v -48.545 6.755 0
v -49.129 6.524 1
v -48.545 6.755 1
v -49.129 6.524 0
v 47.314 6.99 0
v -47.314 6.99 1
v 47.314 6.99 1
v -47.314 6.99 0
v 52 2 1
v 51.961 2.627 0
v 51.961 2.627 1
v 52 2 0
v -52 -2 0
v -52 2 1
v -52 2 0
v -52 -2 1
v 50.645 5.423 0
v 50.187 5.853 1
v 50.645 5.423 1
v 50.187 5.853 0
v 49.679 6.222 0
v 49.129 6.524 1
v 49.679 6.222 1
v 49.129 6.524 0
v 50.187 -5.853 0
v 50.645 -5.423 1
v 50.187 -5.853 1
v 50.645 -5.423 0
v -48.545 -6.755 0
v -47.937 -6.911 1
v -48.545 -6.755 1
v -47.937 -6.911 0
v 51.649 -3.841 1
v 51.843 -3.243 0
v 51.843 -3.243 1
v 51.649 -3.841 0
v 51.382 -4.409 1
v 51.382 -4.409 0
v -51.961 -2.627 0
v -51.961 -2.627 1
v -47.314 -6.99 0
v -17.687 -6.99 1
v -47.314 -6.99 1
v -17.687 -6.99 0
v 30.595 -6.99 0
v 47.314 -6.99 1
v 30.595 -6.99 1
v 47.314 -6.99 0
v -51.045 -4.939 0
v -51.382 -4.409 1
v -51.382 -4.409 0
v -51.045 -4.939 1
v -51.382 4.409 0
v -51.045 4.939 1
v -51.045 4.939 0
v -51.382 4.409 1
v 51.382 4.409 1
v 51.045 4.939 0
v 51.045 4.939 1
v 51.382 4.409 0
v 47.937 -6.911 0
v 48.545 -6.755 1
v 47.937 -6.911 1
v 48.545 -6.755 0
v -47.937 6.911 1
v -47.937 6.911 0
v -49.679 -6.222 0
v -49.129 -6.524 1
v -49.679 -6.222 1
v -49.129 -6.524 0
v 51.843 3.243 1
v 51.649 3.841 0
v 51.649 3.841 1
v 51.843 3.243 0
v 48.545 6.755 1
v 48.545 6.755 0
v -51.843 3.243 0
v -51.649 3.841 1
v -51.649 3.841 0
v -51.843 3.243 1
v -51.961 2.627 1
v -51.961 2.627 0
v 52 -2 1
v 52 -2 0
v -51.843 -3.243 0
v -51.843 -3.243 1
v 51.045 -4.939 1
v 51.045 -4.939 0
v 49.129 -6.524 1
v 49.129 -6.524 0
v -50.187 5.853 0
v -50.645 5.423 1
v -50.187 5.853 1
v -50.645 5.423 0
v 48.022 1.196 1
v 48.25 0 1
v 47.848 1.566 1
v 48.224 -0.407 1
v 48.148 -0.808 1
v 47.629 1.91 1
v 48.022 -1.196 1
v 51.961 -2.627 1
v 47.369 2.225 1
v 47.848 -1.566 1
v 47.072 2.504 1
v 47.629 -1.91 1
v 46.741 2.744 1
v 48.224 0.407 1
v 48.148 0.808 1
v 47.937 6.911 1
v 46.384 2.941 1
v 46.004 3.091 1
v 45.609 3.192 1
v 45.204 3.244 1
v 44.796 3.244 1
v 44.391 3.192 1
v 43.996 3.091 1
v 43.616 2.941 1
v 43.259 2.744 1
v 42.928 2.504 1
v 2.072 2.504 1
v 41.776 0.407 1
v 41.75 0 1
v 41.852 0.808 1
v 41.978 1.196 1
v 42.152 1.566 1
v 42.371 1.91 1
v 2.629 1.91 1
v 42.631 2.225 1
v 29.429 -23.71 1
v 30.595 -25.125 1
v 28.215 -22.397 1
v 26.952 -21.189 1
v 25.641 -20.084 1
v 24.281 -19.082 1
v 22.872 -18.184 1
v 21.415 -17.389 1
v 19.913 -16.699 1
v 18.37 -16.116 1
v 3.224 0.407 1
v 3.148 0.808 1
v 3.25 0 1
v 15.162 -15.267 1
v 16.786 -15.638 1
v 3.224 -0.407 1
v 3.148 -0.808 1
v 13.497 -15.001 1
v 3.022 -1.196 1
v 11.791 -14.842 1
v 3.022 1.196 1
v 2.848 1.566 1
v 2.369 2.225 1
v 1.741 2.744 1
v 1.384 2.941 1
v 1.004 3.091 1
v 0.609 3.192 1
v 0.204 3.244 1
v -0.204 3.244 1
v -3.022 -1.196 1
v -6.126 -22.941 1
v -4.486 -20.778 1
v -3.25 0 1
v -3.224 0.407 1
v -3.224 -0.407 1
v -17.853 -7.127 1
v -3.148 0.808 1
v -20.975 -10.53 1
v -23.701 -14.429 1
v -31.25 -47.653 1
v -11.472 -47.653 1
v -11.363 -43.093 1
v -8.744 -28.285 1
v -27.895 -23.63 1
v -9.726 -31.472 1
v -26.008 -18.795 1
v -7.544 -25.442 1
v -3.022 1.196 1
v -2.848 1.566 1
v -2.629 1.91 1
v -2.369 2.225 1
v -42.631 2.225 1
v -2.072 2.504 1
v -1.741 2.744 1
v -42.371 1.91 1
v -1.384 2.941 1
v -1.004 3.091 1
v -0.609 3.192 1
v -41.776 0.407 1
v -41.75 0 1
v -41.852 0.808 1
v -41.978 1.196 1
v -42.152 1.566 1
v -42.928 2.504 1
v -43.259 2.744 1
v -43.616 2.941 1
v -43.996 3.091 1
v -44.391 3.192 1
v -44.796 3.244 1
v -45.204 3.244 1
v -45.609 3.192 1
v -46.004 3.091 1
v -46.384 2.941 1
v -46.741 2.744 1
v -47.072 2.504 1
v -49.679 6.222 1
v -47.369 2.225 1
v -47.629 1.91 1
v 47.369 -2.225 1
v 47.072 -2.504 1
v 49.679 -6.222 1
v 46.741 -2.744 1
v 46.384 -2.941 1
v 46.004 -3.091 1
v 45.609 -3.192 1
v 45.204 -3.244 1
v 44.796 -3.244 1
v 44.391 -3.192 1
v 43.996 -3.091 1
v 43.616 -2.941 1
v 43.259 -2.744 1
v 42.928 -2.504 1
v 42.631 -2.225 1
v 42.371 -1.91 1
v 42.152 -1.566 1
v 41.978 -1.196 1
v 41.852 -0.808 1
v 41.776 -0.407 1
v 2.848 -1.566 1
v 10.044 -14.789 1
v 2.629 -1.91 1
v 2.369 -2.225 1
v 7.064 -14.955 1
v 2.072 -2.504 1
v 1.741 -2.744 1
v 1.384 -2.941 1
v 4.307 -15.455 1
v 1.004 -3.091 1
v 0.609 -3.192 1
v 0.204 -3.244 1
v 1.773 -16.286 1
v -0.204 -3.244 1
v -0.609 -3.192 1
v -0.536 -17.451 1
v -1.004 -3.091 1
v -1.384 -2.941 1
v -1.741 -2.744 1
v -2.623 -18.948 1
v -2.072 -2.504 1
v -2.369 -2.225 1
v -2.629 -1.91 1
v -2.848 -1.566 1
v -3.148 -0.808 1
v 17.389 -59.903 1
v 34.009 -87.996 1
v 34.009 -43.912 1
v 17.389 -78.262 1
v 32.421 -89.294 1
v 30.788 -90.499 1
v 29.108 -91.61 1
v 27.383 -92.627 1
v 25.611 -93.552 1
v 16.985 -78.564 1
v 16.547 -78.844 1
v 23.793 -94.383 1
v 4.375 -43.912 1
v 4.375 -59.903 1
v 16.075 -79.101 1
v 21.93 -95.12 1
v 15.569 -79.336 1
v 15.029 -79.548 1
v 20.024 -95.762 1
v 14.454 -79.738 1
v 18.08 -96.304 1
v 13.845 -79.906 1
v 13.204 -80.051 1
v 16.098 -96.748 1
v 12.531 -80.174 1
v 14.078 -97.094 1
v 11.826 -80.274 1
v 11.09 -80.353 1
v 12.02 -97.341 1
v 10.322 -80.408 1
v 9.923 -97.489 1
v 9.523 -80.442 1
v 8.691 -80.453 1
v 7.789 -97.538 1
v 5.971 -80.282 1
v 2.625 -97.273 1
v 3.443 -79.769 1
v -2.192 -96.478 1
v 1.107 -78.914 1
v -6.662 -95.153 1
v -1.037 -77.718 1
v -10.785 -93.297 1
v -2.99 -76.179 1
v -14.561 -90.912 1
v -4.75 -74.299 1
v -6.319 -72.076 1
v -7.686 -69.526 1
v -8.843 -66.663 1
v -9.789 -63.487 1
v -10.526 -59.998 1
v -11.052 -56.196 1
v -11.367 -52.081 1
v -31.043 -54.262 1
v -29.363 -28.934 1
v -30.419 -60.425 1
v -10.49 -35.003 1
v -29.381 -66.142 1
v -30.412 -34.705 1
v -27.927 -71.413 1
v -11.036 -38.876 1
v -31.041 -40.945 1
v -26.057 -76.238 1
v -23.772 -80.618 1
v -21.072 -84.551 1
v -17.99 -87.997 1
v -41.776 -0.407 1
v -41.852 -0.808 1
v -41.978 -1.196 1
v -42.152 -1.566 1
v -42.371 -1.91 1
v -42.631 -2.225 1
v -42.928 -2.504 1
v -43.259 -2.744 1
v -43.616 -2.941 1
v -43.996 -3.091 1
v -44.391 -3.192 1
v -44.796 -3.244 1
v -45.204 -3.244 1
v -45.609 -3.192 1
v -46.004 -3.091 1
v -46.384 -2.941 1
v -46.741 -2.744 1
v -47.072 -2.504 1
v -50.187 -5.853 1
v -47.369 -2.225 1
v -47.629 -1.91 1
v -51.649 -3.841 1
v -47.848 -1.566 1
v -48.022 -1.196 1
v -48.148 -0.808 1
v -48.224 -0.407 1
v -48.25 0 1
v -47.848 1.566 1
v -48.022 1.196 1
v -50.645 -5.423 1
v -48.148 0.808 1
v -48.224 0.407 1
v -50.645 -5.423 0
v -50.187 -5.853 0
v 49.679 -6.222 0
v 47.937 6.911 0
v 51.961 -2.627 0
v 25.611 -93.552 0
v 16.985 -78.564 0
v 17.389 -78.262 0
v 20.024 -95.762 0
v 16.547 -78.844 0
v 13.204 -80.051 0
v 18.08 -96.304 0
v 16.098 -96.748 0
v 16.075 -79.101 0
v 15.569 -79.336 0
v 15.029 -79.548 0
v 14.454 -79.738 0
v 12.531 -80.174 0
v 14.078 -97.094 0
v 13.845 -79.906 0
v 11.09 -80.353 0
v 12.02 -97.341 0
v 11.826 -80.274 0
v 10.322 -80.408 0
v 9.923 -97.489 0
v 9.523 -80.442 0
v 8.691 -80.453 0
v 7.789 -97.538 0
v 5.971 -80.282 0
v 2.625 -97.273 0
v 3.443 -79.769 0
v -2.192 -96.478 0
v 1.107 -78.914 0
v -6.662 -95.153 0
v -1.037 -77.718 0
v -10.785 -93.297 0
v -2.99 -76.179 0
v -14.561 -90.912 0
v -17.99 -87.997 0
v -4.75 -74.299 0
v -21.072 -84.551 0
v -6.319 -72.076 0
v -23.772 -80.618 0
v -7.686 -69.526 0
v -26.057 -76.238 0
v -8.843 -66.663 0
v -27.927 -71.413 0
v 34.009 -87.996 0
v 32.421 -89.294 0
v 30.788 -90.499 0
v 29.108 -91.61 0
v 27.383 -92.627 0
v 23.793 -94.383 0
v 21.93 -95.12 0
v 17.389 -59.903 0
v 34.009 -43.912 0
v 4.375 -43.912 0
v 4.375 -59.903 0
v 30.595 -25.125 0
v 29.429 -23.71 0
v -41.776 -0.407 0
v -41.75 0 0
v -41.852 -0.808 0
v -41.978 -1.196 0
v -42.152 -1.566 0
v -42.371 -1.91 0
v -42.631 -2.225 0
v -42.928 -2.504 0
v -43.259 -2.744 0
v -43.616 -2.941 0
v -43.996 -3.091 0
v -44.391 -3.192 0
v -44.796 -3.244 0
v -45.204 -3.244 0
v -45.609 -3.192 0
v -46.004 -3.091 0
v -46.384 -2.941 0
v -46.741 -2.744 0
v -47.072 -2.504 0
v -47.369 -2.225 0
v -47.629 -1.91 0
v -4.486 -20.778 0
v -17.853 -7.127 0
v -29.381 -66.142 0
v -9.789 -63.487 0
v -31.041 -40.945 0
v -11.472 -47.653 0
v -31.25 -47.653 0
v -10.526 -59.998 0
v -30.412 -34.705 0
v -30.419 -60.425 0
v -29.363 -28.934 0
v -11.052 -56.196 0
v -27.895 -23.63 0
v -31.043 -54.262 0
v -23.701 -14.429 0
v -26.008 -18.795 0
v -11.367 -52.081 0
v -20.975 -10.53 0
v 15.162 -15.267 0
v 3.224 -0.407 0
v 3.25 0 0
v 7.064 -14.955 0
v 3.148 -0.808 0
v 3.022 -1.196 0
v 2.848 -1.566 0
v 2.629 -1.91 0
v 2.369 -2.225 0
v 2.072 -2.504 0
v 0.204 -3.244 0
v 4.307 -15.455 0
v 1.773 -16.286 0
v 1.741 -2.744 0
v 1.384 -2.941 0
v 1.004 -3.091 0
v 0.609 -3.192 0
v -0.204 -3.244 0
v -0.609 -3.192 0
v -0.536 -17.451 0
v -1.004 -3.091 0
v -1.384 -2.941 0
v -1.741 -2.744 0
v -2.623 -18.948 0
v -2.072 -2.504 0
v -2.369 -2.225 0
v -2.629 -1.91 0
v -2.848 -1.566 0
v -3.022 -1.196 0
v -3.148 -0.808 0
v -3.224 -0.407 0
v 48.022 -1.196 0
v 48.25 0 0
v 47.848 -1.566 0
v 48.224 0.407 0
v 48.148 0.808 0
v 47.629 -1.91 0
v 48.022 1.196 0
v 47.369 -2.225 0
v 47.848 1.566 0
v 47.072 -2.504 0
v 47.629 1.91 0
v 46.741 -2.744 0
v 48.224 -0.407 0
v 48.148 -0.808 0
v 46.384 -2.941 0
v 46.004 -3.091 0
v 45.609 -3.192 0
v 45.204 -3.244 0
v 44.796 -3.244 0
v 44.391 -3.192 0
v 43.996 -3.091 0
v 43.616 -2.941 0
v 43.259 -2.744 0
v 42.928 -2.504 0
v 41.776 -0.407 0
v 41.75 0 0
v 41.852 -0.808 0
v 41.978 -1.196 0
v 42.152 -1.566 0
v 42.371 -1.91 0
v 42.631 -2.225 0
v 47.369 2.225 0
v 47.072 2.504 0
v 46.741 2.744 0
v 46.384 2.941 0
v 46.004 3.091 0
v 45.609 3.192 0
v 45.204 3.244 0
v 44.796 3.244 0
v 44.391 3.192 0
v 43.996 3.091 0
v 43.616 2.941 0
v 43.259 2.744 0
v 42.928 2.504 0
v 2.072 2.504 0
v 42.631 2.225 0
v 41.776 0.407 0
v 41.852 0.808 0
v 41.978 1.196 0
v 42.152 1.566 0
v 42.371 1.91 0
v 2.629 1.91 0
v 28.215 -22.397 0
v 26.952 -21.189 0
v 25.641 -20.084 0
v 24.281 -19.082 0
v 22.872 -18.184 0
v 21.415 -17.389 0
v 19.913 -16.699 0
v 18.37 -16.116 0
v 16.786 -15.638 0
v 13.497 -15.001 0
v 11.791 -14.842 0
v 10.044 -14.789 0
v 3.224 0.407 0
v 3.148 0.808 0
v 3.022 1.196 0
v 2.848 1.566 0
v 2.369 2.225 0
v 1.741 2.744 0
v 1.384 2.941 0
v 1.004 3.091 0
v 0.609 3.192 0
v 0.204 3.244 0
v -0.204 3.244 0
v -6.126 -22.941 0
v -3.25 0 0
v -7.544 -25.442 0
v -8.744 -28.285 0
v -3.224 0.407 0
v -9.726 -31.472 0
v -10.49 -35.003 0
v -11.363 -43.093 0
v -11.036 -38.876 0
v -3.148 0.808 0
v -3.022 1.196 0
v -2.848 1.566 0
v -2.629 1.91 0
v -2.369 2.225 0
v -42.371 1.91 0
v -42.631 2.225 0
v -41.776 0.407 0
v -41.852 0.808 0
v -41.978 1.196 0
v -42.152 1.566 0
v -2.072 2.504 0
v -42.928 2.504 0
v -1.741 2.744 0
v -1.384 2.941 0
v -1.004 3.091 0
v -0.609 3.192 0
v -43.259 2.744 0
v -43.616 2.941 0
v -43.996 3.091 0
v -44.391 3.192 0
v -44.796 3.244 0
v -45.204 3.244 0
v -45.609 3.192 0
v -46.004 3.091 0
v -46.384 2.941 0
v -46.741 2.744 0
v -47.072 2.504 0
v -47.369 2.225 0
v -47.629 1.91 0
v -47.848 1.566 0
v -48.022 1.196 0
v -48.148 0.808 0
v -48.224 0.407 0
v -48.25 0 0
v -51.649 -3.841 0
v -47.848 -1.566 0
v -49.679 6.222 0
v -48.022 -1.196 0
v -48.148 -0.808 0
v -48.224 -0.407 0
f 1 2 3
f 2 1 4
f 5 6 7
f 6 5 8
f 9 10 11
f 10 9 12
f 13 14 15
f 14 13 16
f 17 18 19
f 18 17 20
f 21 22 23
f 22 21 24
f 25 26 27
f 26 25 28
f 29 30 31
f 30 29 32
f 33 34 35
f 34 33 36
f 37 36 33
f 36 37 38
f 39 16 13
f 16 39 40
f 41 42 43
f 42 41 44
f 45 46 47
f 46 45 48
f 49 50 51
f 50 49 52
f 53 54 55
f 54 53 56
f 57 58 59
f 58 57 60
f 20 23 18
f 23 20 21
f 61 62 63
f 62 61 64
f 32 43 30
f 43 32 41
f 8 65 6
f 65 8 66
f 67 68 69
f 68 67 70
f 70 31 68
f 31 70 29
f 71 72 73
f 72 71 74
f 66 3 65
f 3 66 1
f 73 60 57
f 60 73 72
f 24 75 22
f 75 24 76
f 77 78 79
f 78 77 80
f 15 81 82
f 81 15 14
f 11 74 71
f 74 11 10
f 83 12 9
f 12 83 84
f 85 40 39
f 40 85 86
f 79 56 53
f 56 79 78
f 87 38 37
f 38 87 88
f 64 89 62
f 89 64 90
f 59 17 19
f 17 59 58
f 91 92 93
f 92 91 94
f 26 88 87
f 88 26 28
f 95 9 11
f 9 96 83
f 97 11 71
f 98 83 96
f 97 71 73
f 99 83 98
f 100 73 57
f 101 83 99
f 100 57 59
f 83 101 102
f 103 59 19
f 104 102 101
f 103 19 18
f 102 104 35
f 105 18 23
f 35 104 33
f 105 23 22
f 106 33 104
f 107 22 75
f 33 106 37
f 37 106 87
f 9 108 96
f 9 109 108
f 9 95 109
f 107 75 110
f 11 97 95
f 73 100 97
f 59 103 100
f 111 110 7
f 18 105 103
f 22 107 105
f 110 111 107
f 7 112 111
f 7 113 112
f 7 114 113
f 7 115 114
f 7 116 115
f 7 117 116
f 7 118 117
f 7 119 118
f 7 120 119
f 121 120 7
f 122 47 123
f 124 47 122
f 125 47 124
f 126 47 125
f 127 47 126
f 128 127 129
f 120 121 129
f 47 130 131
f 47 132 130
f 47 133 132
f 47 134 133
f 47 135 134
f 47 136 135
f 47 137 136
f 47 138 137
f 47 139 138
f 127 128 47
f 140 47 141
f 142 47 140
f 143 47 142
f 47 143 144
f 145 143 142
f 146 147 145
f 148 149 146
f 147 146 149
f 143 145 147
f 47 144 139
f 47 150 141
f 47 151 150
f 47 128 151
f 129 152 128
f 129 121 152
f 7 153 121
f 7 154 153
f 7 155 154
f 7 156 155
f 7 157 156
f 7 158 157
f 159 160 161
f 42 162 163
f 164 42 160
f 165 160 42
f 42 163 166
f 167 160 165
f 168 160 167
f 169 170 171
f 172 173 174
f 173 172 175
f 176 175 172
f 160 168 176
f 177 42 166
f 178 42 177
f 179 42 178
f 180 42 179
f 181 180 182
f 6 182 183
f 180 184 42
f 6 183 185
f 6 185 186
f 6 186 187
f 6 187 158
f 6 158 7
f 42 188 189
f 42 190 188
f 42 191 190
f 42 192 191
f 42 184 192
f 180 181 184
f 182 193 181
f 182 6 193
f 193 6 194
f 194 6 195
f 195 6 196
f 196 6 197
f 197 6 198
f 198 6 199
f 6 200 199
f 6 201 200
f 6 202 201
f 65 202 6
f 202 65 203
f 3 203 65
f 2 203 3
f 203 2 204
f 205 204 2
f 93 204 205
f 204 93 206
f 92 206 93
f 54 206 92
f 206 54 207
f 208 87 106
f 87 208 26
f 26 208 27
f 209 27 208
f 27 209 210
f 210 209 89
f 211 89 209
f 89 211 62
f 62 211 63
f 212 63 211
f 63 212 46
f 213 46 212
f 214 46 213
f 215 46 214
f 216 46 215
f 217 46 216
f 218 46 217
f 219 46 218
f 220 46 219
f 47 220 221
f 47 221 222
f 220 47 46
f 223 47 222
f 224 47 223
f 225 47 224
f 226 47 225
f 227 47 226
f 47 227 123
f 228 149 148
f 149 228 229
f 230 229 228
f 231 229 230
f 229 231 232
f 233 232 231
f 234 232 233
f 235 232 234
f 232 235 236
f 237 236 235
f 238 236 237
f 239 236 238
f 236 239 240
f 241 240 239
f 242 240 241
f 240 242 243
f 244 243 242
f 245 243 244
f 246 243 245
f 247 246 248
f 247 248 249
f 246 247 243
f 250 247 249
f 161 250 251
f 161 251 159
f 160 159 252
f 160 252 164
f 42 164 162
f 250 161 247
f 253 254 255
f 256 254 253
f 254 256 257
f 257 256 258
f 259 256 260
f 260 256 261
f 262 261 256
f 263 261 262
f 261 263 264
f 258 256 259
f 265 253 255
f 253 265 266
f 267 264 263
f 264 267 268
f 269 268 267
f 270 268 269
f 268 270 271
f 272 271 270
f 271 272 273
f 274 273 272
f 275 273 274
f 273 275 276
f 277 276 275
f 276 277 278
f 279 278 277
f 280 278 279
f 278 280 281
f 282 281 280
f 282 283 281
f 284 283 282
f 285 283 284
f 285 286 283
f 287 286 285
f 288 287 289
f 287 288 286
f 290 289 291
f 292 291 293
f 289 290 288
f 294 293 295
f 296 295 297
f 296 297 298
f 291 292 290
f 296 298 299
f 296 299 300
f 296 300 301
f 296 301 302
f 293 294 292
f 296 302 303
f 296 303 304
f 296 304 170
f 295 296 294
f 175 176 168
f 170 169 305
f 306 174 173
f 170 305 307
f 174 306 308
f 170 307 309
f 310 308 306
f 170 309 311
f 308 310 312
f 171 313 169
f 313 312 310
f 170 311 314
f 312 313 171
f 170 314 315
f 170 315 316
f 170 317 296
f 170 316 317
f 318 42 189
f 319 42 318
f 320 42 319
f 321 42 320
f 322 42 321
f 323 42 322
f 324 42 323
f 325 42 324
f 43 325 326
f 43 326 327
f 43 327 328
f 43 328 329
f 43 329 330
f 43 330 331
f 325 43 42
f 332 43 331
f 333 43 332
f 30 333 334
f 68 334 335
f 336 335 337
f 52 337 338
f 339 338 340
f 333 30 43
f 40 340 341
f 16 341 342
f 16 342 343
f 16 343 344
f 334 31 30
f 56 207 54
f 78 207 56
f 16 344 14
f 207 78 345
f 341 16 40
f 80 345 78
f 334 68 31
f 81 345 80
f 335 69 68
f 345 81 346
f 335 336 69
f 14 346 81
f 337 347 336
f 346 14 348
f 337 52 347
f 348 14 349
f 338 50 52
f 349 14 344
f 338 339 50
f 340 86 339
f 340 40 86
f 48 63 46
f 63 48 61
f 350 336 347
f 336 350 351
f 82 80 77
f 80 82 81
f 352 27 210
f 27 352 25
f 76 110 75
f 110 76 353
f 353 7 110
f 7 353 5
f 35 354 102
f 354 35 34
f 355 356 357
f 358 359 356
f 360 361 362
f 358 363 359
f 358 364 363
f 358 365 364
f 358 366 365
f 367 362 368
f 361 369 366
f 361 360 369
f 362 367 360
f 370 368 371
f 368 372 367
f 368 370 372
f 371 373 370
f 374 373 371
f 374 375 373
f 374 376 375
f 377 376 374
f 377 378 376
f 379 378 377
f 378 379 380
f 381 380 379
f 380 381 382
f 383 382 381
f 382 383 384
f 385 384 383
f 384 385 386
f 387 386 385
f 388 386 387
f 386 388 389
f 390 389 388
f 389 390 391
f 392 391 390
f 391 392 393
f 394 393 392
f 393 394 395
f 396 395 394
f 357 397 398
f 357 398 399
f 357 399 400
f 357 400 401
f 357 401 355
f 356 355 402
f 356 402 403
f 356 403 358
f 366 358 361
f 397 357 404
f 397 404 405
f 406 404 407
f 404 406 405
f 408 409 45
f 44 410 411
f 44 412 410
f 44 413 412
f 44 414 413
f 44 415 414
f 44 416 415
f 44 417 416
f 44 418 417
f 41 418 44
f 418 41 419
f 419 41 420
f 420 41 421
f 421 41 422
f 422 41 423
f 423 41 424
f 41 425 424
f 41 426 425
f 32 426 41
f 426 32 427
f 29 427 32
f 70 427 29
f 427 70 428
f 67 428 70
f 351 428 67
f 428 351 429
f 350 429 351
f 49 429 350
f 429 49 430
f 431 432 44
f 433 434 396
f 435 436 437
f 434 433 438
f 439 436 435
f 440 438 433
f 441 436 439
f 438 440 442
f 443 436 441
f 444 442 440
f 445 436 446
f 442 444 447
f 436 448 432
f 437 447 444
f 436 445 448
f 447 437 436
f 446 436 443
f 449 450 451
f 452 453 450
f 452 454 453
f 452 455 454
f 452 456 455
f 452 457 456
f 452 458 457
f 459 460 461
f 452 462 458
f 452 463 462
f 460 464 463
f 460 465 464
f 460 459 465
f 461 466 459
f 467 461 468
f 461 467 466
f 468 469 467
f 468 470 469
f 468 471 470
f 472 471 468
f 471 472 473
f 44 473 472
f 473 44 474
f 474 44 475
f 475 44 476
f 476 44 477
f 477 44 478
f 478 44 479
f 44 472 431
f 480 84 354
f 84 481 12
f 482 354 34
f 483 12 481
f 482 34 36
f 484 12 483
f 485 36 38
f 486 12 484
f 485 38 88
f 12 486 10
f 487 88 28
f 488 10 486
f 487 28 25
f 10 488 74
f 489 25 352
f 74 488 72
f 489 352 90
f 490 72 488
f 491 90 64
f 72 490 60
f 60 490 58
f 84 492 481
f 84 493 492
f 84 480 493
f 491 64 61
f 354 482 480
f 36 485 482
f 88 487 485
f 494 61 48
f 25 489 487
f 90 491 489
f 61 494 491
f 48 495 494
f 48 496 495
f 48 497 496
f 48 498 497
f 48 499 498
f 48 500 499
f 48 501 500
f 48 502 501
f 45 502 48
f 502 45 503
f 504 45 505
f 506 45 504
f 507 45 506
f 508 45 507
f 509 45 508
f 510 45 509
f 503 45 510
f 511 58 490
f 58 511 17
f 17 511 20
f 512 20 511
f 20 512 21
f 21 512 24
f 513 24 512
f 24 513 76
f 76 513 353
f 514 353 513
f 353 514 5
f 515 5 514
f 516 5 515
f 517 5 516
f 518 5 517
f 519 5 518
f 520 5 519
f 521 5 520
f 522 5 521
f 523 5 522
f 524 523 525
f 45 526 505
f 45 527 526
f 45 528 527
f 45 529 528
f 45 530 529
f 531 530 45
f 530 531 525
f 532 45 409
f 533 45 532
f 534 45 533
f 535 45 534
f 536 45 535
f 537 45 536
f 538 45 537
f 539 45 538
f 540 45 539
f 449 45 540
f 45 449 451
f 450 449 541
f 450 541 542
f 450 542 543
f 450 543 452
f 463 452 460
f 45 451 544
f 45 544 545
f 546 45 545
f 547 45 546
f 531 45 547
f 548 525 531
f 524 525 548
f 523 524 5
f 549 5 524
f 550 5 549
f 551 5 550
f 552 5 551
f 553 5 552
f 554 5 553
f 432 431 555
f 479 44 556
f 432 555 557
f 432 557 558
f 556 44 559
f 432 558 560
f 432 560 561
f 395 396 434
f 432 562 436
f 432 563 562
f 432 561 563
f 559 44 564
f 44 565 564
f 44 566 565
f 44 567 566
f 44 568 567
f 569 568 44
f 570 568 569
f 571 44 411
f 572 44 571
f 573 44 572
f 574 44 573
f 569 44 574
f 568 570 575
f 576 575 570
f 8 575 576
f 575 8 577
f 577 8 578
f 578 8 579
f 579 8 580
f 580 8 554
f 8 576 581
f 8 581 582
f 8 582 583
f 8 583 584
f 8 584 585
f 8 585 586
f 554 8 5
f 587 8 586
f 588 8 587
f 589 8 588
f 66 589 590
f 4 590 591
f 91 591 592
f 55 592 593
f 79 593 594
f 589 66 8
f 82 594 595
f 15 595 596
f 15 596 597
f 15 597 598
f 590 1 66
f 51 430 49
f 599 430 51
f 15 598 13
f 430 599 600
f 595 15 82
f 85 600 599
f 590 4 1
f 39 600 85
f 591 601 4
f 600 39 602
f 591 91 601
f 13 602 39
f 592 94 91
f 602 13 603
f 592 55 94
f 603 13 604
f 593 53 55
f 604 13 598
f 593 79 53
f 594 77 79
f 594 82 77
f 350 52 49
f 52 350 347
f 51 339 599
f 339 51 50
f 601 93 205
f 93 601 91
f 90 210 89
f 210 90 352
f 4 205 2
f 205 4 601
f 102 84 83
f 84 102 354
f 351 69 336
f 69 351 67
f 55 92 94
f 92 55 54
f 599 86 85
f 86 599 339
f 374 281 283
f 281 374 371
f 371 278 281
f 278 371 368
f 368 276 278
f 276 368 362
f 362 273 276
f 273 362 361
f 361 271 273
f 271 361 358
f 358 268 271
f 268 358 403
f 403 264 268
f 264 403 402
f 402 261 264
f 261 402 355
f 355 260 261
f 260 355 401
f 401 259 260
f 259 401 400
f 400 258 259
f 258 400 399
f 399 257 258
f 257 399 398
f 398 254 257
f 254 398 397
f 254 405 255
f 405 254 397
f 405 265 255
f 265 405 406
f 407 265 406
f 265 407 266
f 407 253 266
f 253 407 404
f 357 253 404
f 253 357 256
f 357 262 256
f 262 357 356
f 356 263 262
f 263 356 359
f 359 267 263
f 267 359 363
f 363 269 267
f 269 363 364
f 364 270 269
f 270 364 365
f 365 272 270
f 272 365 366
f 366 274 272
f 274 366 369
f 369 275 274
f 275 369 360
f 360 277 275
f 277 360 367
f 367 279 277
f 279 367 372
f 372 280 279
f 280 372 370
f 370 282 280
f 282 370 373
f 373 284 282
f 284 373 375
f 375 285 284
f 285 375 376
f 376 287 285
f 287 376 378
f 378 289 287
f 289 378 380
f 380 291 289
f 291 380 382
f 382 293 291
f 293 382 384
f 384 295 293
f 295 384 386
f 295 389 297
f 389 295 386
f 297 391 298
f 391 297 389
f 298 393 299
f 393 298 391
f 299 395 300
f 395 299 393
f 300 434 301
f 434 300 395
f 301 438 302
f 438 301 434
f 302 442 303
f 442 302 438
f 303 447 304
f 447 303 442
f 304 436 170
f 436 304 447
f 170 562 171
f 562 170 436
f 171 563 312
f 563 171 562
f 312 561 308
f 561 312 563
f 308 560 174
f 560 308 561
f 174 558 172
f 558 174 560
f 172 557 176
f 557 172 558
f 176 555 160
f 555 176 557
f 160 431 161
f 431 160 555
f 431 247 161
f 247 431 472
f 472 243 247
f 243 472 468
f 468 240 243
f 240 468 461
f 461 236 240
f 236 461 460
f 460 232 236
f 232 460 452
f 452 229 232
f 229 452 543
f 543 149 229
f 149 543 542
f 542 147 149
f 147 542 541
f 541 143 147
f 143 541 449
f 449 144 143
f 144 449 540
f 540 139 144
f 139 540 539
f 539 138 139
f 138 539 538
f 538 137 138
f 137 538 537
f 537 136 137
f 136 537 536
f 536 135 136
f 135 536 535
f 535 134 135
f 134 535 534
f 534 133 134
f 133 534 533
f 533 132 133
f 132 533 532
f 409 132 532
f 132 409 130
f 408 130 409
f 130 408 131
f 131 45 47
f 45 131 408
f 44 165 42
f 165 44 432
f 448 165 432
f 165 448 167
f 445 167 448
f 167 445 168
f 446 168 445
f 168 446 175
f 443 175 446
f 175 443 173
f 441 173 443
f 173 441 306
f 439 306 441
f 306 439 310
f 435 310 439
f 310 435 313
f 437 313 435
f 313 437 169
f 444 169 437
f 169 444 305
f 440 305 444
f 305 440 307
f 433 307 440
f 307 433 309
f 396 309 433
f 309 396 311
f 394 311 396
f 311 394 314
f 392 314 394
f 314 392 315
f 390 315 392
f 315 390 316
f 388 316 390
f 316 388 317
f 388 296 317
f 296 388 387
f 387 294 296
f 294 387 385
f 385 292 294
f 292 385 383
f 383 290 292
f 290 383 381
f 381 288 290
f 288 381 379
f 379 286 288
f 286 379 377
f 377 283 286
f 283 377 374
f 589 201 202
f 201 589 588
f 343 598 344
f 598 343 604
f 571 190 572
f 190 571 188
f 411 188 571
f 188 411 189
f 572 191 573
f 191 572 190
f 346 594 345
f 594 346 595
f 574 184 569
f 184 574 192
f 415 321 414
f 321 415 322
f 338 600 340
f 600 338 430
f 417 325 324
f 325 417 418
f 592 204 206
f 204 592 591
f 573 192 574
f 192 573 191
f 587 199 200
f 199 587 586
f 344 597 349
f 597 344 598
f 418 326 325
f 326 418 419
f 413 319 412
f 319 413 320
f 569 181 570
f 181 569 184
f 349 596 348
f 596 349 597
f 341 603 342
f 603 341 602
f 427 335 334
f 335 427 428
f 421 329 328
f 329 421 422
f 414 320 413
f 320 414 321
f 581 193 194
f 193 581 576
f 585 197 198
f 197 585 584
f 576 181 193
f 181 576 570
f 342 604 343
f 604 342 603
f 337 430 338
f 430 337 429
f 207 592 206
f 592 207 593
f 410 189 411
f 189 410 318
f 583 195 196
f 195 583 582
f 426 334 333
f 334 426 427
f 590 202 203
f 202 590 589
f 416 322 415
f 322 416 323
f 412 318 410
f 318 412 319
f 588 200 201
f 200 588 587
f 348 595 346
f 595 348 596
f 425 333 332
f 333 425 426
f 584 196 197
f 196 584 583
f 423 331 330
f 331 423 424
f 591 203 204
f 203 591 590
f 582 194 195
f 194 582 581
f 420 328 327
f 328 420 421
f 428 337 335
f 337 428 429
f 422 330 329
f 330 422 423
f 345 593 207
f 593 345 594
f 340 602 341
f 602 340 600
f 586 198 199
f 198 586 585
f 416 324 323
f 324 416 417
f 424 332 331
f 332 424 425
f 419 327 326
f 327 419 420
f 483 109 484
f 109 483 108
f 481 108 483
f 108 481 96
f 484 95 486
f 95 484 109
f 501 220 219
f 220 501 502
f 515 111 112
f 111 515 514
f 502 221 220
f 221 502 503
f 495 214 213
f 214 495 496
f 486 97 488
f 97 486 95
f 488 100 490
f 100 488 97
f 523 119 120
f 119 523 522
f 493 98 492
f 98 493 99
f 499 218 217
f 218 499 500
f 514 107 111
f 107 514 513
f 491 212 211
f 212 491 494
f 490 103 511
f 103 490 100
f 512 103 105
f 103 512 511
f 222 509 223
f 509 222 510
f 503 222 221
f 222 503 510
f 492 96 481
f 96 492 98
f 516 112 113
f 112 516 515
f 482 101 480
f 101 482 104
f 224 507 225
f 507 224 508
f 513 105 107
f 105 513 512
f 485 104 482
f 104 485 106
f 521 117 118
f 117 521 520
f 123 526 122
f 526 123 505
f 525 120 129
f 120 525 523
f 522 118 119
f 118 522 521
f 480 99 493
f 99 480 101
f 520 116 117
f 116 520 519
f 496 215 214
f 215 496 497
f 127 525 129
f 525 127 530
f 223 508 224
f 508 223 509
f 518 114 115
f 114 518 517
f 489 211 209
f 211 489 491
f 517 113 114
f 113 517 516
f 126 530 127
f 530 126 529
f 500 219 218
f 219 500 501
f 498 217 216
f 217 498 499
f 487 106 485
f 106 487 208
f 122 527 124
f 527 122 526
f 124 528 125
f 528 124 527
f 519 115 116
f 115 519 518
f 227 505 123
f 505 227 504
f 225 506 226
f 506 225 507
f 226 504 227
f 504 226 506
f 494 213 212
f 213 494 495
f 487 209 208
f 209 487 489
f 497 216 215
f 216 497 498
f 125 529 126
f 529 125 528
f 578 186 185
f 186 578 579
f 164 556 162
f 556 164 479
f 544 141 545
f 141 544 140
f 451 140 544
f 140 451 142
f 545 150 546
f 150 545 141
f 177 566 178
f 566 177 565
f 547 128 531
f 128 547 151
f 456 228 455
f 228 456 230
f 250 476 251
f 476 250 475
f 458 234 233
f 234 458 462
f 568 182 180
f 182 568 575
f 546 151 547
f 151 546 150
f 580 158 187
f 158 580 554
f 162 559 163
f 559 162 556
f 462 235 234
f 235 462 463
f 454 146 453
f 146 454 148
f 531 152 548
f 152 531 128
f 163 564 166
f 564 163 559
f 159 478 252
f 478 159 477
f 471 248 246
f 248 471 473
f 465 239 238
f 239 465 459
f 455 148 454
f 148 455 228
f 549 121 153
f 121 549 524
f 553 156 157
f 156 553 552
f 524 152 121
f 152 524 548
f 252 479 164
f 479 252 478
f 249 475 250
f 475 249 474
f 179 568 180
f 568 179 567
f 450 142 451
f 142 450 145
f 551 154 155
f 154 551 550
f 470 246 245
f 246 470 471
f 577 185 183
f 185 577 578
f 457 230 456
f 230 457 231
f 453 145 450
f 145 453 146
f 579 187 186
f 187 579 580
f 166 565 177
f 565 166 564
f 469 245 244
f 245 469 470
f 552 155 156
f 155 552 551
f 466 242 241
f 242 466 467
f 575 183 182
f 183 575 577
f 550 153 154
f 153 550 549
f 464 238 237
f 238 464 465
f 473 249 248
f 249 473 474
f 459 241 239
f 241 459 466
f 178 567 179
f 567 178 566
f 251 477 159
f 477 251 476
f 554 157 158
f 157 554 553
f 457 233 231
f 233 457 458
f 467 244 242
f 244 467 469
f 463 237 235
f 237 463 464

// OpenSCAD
$fn = 50;


difference() {
	union() {
		translate(v = [0, 0, 0]) {
			rotate(a = [0, 0, 0]) {
				hull() {
					translate(v = [-47.0000000000, 2.0000000000, 0]) {
						rotate(a = [0, 0, 0]) {
							translate(v = [0, 0, 0]) {
								rotate(a = [0, 0, 0]) {
									cylinder(h = 1, r = 5);
								}
							}
						}
					}
					translate(v = [47.0000000000, 2.0000000000, 0]) {
						rotate(a = [0, 0, 0]) {
							translate(v = [0, 0, 0]) {
								rotate(a = [0, 0, 0]) {
									cylinder(h = 1, r = 5);
								}
							}
						}
					}
					translate(v = [-47.0000000000, -2.0000000000, 0]) {
						rotate(a = [0, 0, 0]) {
							translate(v = [0, 0, 0]) {
								rotate(a = [0, 0, 0]) {
									cylinder(h = 1, r = 5);
								}
							}
						}
					}
					translate(v = [47.0000000000, -2.0000000000, 0]) {
						rotate(a = [0, 0, 0]) {
							translate(v = [0, 0, 0]) {
								rotate(a = [0, 0, 0]) {
									cylinder(h = 1, r = 5);
								}
							}
						}
					}
				}
			}
		}
		translate(v = [0, 0, 0]) {
			rotate(a = [0, 0, 0]) {
				linear_extrude(height = 1) {
					text(font = "DejaVu Sans Mono:style=Bold", halign = "center", size = 95.0000000000, text = "G", valign = "top");
				}
			}
		}
	}
	union() {
		translate(v = [-45.0000000000, 0.0000000000, -125.0000000000]) {
			rotate(a = [0, 0, 0]) {
				cylinder(h = 250, r = 3.2500000000);
			}
		}
		translate(v = [45.0000000000, 0.0000000000, -125.0000000000]) {
			rotate(a = [0, 0, 0]) {
				cylinder(h = 250, r = 3.2500000000);
			}
		}
		translate(v = [45.0000000000, 0.0000000000, -125.0000000000]) {
			rotate(a = [0, 0, 0]) {
				cylinder(h = 250, r = 3.2500000000);
			}
		}
		translate(v = [0, 0, -125.0000000000]) {
			rotate(a = [0, 0, 0]) {
				cylinder(h = 250, r = 3.2500000000);
			}
		}
	}
}
